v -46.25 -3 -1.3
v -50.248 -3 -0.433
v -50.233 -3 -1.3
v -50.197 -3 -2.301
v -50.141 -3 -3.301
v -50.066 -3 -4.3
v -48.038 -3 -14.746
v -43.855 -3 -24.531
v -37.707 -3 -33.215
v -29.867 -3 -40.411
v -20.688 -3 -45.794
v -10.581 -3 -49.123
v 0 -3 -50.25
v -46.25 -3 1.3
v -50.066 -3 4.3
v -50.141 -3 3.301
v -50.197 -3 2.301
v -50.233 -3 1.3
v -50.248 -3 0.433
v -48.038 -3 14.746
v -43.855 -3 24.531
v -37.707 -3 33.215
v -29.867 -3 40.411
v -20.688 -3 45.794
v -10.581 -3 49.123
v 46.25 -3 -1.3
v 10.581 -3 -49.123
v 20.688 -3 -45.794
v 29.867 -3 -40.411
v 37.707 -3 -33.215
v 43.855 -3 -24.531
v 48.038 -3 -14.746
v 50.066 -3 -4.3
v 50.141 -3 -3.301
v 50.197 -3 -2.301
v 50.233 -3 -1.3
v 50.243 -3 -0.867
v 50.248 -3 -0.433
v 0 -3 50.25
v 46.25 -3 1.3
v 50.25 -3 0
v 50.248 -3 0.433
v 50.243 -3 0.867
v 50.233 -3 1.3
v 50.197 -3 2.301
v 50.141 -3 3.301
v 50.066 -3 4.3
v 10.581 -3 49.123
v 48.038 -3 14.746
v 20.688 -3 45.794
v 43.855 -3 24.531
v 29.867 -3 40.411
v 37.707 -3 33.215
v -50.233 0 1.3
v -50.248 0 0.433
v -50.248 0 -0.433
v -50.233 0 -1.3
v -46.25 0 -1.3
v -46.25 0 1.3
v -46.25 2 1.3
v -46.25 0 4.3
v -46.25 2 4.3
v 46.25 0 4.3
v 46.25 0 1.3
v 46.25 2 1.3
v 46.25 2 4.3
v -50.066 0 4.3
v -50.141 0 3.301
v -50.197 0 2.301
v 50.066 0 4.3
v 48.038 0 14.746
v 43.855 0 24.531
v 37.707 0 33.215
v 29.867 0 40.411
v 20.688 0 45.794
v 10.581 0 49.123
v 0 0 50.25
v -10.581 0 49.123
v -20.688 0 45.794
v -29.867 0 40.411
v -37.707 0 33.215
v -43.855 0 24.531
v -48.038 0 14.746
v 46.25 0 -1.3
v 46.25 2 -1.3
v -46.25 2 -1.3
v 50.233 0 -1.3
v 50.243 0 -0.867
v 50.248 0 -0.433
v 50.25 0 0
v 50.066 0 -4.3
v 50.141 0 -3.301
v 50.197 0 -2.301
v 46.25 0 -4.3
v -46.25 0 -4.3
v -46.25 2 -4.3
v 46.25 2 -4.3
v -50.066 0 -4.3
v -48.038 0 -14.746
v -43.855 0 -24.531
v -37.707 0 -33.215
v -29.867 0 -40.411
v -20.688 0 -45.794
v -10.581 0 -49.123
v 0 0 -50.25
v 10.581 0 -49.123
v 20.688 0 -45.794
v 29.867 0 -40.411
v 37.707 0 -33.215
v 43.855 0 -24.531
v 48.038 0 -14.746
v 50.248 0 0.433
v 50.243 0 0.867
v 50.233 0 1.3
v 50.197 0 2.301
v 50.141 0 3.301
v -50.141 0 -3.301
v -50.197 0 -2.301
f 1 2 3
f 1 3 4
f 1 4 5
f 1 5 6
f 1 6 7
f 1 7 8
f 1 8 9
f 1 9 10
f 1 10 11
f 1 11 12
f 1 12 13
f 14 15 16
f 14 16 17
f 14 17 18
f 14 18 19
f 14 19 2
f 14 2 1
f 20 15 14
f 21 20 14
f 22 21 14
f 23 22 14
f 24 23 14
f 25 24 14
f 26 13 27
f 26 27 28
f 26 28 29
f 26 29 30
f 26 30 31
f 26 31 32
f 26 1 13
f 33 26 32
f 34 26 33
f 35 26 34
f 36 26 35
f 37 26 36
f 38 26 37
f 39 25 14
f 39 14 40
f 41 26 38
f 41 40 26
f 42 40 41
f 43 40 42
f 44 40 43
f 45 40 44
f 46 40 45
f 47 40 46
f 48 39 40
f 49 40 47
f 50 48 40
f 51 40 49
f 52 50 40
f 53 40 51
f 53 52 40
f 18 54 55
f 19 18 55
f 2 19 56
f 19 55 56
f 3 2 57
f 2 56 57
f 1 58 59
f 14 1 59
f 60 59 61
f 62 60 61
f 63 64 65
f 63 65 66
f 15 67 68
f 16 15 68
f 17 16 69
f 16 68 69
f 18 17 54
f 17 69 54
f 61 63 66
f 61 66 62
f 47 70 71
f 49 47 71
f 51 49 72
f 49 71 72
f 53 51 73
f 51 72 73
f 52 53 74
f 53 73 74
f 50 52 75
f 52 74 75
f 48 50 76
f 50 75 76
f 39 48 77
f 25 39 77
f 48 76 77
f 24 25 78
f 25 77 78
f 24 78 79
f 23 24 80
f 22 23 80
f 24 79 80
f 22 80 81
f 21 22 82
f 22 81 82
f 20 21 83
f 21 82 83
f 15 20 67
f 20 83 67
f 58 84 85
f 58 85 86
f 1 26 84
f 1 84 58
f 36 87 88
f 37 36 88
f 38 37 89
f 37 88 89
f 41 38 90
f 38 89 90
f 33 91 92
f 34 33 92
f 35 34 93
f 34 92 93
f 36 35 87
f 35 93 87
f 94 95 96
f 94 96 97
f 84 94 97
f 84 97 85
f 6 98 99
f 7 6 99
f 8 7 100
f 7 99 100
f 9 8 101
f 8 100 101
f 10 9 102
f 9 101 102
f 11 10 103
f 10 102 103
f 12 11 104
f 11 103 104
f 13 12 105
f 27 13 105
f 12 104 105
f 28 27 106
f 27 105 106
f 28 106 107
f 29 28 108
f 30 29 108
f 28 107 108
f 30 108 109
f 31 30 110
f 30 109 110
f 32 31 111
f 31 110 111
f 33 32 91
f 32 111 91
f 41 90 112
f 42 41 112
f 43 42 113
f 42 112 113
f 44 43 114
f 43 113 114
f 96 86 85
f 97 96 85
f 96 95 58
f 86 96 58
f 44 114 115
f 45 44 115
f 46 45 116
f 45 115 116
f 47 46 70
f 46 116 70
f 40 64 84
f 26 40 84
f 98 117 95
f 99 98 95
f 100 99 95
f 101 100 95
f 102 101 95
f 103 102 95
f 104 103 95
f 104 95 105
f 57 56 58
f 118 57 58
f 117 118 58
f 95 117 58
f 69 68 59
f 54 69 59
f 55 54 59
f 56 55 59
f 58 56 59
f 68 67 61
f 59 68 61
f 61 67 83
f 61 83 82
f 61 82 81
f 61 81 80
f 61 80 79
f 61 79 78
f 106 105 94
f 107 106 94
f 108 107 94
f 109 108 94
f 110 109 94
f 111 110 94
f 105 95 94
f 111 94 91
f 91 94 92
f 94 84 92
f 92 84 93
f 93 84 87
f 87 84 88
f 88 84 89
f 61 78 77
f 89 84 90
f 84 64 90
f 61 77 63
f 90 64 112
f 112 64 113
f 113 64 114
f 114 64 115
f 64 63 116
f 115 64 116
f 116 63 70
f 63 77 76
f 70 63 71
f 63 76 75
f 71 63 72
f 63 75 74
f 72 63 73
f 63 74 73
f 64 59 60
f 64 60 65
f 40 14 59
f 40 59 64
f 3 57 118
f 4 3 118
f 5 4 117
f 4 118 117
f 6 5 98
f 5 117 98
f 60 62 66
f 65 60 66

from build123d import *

# Parameters (mm, degrees)
F0_W     = 50
F0_H     = 3
F0_W_2   = 21.25
F1_DEPTH = 3
F2_DEPTH = 2


with BuildPart() as f1:
    # F0 (on Front) → F1 (new body)
    with BuildSketch(Plane.XZ):
        with BuildLine():
            ThreePointArc((50.233181265, -1.3), (50.2457951403, -0.6500543958), (50.25, 0))
            ThreePointArc((50.25, 0), (50.2457951403, 0.6500543958), (50.233181265, 1.3))
            Line((50.233181265, 1.3), (46.25, 1.3))
            Line((46.25, 1.3), (46.25, -1.3))
            Line((46.25, -1.3), (50.233181265, -1.3))
        make_face()
        with BuildLine():
            Line((46.25, 1.3), (50.233181265, 1.3))
            ThreePointArc((50.233181265, 1.3), (50.171859503, 2.8012522223), (50.0656818589, 4.3))
            Line((50.0656818589, 4.3), (46.25, 4.3))
            Line((46.25, 4.3), (46.25, 1.3))
        make_face()
        with BuildLine():
            ThreePointArc((50.0656818589, -4.3), (50.171859503, -2.8012522223), (50.233181265, -1.3))
            Line((50.233181265, -1.3), (46.25, -1.3))
            Line((46.25, -1.3), (46.25, -4.3))
            Line((46.25, -4.3), (50.0656818589, -4.3))
        make_face()
        with BuildLine():
            Line((46.25, 4.3), (50.0656818589, 4.3))
            ThreePointArc((50.0656818589, 4.3), (0, 50.25), (-50.0656818589, 4.3))
            Line((-50.0656818589, 4.3), (-46.25, 4.3))
            Line((-46.25, 4.3), (-25, 4.3))
            Line((-25, 4.3), (25, 4.3))
            Line((25, 4.3), (46.25, 4.3))
        make_face()
        with BuildLine():
            ThreePointArc((-50.0656818589, -4.3), (0, -50.25), (50.0656818589, -4.3))
            Line((50.0656818589, -4.3), (46.25, -4.3))
            Line((46.25, -4.3), (25, -4.3))
            Line((25, -4.3), (-25, -4.3))
            Line((-25, -4.3), (-46.25, -4.3))
            Line((-46.25, -4.3), (-50.0656818589, -4.3))
        make_face()
        with BuildLine():
            Line((-46.25, 4.3), (-50.0656818589, 4.3))
            ThreePointArc((-50.0656818589, 4.3), (-50.171859503, 2.8012522223), (-50.233181265, 1.3))
            Line((-50.233181265, 1.3), (-46.25, 1.3))
            Line((-46.25, 1.3), (-46.25, 4.3))
        make_face()
        with BuildLine():
            ThreePointArc((-50.233181265, -1.3), (-50.171859503, -2.8012522223), (-50.0656818589, -4.3))
            Line((-50.0656818589, -4.3), (-46.25, -4.3))
            Line((-46.25, -4.3), (-46.25, -1.3))
            Line((-46.25, -1.3), (-50.233181265, -1.3))
        make_face()
        with BuildLine():
            Line((-46.25, 1.3), (-50.233181265, 1.3))
            ThreePointArc((-50.233181265, 1.3), (-50.25, 0), (-50.233181265, -1.3))
            Line((-50.233181265, -1.3), (-46.25, -1.3))
            Line((-46.25, -1.3), (-46.25, 1.3))
        make_face()
        with Locations((0, -2.8)):
            Rectangle(F0_W, F0_H)
        with Locations((0, 2.8)):
            Rectangle(F0_W, F0_H)
        with Locations((-35.625, 2.8)):
            Rectangle(F0_W_2, F0_H)
        with Locations((35.625, 2.8)):
            Rectangle(F0_W_2, F0_H)
        with Locations((35.625, -2.8)):
            Rectangle(F0_W_2, F0_H)
        with Locations((-35.625, -2.8)):
            Rectangle(F0_W_2, F0_H)
    extrude(amount=F1_DEPTH)

    # F0 (on Front) → F2 (join)
    with BuildSketch(Plane.XZ):
        with Locations((0, -2.8)):
            Rectangle(F0_W, F0_H)
        with Locations((0, 2.8)):
            Rectangle(F0_W, F0_H)
        with Locations((35.625, -2.8)):
            Rectangle(F0_W_2, F0_H)
        with Locations((35.625, 2.8)):
            Rectangle(F0_W_2, F0_H)
        with Locations((-35.625, 2.8)):
            Rectangle(F0_W_2, F0_H)
        with Locations((-35.625, -2.8)):
            Rectangle(F0_W_2, F0_H)
    extrude(amount=-F2_DEPTH)


solid = f1.part
